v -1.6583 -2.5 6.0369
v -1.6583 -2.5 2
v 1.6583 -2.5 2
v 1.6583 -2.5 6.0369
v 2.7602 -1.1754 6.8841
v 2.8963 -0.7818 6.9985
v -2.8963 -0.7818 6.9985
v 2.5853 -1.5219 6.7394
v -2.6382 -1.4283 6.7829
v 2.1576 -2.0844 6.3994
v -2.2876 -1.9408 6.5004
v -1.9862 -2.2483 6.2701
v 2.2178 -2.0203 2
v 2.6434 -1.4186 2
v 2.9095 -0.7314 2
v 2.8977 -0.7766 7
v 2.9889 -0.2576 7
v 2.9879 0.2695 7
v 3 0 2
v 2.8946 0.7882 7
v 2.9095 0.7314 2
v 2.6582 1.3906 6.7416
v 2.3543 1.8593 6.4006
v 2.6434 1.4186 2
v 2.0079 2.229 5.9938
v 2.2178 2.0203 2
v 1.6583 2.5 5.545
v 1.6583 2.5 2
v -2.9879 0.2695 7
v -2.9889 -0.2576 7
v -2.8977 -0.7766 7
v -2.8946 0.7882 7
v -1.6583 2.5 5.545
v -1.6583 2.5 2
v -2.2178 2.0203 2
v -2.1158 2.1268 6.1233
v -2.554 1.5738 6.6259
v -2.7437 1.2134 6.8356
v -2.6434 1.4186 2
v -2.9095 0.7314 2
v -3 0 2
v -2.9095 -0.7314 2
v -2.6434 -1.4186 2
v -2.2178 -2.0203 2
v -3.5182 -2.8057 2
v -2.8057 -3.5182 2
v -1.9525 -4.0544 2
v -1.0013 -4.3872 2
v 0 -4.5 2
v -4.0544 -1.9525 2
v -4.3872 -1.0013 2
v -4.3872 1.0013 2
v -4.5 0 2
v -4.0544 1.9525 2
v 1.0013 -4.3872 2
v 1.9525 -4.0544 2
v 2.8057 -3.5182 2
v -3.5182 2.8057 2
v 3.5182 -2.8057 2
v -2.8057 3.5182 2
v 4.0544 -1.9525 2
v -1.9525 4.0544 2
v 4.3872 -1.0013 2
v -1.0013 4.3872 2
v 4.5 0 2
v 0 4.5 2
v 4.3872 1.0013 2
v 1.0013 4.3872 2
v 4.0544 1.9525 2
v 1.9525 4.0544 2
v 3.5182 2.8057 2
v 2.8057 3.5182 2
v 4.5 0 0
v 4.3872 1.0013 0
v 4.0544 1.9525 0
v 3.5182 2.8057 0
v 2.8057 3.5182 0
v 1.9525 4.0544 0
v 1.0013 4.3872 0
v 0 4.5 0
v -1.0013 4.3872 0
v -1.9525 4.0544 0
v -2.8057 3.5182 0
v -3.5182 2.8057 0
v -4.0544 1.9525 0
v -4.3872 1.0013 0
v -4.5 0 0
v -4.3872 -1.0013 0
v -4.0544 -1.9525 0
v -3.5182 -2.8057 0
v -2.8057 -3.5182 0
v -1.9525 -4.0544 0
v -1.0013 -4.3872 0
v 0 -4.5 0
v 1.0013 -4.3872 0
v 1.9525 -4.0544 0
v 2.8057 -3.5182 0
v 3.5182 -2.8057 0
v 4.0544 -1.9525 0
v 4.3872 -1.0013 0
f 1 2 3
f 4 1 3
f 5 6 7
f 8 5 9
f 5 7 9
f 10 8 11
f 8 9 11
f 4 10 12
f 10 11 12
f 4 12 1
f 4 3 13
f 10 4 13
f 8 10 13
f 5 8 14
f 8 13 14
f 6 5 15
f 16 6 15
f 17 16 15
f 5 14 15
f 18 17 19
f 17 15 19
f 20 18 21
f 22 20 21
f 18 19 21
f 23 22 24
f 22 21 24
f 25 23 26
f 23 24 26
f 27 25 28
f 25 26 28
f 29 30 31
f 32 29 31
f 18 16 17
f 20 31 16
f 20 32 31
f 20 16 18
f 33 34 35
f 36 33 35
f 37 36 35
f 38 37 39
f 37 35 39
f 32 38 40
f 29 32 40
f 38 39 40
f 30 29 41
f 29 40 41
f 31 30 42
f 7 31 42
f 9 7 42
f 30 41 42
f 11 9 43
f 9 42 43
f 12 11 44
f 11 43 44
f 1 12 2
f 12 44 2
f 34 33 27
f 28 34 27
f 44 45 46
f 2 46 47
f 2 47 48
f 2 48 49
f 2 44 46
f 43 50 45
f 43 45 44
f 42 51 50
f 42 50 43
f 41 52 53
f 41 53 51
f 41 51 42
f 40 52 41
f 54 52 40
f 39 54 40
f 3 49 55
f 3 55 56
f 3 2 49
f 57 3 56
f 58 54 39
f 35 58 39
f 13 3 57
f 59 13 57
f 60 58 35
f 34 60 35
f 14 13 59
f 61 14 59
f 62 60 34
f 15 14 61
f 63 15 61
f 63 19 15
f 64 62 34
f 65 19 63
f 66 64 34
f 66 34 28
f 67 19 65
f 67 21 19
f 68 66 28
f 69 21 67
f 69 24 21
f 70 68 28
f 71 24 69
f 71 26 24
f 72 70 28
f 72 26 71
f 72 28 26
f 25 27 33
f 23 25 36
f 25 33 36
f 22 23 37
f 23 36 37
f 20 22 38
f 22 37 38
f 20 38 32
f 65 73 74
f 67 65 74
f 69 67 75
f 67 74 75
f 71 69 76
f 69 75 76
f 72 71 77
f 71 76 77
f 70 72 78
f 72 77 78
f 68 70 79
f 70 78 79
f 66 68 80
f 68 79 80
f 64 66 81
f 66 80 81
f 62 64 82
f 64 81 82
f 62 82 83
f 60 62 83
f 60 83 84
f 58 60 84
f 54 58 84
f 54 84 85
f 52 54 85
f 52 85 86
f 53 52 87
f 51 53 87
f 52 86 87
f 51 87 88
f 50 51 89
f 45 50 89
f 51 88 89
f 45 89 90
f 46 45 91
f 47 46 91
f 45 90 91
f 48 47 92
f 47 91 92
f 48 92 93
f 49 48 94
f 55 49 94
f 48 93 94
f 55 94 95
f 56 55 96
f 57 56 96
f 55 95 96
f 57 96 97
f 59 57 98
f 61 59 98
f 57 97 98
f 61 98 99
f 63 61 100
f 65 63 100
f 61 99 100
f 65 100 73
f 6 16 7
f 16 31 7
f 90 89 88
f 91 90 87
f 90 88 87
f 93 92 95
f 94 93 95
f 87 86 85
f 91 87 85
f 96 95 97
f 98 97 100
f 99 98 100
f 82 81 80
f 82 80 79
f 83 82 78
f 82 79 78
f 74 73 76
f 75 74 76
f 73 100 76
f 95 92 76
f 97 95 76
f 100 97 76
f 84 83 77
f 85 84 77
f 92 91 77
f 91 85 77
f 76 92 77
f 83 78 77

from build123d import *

# Parameters (mm, degrees)
SKETCH_R          = 4.5
PAD_DEPTH         = 2
PAD001_DEPTH      = 7
POCKET_DEPTH      = 4.501
POCKET_DEPTH_BACK = -4.501


with BuildPart() as part:
    # Sketch → Pad (new body)
    with BuildSketch(Plane.XY):
        Circle(SKETCH_R)
    extrude(amount=PAD_DEPTH)

    # Sketch001 → Pad001 (join)
    with BuildSketch(Plane.XY):
        with BuildLine():
            ThreePointArc((-1.658312, 2.5), (-3, 0), (-1.658312, -2.5))
            Line((-1.658312, -2.5), (1.658312, -2.5))
            ThreePointArc((1.658312, -2.5), (3, 0), (1.658312, 2.5))
            Line((-1.658312, 2.5), (1.658312, 2.5))
        make_face()
    extrude(amount=PAD001_DEPTH)

    # Sketch002 → Pocket (cut, two sides)
    with BuildSketch(Plane.YZ) as pocket_sk:
        with BuildLine():
            ThreePointArc((2.746163, 4.734229), (1.500773, 6.674426), (-0.781849, 6.998461))
            ThreePointArc((-0.781849, 6.998461), (-1.981292, 6.473003), (-2.90242, 5.542254))
            Line((-4.129342, 5.542254), (-2.90242, 5.542254))
            Line((-4.129342, 6.557363), (-4.129342, 5.542254))
            Line((-4.129342, 8.966747), (-4.129342, 6.557363))
            Line((2.746163, 8.966747), (-4.129342, 8.966747))
            Line((2.746163, 4.734229), (2.746163, 8.966747))
        make_face()
    extrude(amount=-POCKET_DEPTH, mode=Mode.SUBTRACT)
    extrude(pocket_sk.sketch, amount=-POCKET_DEPTH_BACK, mode=Mode.SUBTRACT)


solid = part.part
